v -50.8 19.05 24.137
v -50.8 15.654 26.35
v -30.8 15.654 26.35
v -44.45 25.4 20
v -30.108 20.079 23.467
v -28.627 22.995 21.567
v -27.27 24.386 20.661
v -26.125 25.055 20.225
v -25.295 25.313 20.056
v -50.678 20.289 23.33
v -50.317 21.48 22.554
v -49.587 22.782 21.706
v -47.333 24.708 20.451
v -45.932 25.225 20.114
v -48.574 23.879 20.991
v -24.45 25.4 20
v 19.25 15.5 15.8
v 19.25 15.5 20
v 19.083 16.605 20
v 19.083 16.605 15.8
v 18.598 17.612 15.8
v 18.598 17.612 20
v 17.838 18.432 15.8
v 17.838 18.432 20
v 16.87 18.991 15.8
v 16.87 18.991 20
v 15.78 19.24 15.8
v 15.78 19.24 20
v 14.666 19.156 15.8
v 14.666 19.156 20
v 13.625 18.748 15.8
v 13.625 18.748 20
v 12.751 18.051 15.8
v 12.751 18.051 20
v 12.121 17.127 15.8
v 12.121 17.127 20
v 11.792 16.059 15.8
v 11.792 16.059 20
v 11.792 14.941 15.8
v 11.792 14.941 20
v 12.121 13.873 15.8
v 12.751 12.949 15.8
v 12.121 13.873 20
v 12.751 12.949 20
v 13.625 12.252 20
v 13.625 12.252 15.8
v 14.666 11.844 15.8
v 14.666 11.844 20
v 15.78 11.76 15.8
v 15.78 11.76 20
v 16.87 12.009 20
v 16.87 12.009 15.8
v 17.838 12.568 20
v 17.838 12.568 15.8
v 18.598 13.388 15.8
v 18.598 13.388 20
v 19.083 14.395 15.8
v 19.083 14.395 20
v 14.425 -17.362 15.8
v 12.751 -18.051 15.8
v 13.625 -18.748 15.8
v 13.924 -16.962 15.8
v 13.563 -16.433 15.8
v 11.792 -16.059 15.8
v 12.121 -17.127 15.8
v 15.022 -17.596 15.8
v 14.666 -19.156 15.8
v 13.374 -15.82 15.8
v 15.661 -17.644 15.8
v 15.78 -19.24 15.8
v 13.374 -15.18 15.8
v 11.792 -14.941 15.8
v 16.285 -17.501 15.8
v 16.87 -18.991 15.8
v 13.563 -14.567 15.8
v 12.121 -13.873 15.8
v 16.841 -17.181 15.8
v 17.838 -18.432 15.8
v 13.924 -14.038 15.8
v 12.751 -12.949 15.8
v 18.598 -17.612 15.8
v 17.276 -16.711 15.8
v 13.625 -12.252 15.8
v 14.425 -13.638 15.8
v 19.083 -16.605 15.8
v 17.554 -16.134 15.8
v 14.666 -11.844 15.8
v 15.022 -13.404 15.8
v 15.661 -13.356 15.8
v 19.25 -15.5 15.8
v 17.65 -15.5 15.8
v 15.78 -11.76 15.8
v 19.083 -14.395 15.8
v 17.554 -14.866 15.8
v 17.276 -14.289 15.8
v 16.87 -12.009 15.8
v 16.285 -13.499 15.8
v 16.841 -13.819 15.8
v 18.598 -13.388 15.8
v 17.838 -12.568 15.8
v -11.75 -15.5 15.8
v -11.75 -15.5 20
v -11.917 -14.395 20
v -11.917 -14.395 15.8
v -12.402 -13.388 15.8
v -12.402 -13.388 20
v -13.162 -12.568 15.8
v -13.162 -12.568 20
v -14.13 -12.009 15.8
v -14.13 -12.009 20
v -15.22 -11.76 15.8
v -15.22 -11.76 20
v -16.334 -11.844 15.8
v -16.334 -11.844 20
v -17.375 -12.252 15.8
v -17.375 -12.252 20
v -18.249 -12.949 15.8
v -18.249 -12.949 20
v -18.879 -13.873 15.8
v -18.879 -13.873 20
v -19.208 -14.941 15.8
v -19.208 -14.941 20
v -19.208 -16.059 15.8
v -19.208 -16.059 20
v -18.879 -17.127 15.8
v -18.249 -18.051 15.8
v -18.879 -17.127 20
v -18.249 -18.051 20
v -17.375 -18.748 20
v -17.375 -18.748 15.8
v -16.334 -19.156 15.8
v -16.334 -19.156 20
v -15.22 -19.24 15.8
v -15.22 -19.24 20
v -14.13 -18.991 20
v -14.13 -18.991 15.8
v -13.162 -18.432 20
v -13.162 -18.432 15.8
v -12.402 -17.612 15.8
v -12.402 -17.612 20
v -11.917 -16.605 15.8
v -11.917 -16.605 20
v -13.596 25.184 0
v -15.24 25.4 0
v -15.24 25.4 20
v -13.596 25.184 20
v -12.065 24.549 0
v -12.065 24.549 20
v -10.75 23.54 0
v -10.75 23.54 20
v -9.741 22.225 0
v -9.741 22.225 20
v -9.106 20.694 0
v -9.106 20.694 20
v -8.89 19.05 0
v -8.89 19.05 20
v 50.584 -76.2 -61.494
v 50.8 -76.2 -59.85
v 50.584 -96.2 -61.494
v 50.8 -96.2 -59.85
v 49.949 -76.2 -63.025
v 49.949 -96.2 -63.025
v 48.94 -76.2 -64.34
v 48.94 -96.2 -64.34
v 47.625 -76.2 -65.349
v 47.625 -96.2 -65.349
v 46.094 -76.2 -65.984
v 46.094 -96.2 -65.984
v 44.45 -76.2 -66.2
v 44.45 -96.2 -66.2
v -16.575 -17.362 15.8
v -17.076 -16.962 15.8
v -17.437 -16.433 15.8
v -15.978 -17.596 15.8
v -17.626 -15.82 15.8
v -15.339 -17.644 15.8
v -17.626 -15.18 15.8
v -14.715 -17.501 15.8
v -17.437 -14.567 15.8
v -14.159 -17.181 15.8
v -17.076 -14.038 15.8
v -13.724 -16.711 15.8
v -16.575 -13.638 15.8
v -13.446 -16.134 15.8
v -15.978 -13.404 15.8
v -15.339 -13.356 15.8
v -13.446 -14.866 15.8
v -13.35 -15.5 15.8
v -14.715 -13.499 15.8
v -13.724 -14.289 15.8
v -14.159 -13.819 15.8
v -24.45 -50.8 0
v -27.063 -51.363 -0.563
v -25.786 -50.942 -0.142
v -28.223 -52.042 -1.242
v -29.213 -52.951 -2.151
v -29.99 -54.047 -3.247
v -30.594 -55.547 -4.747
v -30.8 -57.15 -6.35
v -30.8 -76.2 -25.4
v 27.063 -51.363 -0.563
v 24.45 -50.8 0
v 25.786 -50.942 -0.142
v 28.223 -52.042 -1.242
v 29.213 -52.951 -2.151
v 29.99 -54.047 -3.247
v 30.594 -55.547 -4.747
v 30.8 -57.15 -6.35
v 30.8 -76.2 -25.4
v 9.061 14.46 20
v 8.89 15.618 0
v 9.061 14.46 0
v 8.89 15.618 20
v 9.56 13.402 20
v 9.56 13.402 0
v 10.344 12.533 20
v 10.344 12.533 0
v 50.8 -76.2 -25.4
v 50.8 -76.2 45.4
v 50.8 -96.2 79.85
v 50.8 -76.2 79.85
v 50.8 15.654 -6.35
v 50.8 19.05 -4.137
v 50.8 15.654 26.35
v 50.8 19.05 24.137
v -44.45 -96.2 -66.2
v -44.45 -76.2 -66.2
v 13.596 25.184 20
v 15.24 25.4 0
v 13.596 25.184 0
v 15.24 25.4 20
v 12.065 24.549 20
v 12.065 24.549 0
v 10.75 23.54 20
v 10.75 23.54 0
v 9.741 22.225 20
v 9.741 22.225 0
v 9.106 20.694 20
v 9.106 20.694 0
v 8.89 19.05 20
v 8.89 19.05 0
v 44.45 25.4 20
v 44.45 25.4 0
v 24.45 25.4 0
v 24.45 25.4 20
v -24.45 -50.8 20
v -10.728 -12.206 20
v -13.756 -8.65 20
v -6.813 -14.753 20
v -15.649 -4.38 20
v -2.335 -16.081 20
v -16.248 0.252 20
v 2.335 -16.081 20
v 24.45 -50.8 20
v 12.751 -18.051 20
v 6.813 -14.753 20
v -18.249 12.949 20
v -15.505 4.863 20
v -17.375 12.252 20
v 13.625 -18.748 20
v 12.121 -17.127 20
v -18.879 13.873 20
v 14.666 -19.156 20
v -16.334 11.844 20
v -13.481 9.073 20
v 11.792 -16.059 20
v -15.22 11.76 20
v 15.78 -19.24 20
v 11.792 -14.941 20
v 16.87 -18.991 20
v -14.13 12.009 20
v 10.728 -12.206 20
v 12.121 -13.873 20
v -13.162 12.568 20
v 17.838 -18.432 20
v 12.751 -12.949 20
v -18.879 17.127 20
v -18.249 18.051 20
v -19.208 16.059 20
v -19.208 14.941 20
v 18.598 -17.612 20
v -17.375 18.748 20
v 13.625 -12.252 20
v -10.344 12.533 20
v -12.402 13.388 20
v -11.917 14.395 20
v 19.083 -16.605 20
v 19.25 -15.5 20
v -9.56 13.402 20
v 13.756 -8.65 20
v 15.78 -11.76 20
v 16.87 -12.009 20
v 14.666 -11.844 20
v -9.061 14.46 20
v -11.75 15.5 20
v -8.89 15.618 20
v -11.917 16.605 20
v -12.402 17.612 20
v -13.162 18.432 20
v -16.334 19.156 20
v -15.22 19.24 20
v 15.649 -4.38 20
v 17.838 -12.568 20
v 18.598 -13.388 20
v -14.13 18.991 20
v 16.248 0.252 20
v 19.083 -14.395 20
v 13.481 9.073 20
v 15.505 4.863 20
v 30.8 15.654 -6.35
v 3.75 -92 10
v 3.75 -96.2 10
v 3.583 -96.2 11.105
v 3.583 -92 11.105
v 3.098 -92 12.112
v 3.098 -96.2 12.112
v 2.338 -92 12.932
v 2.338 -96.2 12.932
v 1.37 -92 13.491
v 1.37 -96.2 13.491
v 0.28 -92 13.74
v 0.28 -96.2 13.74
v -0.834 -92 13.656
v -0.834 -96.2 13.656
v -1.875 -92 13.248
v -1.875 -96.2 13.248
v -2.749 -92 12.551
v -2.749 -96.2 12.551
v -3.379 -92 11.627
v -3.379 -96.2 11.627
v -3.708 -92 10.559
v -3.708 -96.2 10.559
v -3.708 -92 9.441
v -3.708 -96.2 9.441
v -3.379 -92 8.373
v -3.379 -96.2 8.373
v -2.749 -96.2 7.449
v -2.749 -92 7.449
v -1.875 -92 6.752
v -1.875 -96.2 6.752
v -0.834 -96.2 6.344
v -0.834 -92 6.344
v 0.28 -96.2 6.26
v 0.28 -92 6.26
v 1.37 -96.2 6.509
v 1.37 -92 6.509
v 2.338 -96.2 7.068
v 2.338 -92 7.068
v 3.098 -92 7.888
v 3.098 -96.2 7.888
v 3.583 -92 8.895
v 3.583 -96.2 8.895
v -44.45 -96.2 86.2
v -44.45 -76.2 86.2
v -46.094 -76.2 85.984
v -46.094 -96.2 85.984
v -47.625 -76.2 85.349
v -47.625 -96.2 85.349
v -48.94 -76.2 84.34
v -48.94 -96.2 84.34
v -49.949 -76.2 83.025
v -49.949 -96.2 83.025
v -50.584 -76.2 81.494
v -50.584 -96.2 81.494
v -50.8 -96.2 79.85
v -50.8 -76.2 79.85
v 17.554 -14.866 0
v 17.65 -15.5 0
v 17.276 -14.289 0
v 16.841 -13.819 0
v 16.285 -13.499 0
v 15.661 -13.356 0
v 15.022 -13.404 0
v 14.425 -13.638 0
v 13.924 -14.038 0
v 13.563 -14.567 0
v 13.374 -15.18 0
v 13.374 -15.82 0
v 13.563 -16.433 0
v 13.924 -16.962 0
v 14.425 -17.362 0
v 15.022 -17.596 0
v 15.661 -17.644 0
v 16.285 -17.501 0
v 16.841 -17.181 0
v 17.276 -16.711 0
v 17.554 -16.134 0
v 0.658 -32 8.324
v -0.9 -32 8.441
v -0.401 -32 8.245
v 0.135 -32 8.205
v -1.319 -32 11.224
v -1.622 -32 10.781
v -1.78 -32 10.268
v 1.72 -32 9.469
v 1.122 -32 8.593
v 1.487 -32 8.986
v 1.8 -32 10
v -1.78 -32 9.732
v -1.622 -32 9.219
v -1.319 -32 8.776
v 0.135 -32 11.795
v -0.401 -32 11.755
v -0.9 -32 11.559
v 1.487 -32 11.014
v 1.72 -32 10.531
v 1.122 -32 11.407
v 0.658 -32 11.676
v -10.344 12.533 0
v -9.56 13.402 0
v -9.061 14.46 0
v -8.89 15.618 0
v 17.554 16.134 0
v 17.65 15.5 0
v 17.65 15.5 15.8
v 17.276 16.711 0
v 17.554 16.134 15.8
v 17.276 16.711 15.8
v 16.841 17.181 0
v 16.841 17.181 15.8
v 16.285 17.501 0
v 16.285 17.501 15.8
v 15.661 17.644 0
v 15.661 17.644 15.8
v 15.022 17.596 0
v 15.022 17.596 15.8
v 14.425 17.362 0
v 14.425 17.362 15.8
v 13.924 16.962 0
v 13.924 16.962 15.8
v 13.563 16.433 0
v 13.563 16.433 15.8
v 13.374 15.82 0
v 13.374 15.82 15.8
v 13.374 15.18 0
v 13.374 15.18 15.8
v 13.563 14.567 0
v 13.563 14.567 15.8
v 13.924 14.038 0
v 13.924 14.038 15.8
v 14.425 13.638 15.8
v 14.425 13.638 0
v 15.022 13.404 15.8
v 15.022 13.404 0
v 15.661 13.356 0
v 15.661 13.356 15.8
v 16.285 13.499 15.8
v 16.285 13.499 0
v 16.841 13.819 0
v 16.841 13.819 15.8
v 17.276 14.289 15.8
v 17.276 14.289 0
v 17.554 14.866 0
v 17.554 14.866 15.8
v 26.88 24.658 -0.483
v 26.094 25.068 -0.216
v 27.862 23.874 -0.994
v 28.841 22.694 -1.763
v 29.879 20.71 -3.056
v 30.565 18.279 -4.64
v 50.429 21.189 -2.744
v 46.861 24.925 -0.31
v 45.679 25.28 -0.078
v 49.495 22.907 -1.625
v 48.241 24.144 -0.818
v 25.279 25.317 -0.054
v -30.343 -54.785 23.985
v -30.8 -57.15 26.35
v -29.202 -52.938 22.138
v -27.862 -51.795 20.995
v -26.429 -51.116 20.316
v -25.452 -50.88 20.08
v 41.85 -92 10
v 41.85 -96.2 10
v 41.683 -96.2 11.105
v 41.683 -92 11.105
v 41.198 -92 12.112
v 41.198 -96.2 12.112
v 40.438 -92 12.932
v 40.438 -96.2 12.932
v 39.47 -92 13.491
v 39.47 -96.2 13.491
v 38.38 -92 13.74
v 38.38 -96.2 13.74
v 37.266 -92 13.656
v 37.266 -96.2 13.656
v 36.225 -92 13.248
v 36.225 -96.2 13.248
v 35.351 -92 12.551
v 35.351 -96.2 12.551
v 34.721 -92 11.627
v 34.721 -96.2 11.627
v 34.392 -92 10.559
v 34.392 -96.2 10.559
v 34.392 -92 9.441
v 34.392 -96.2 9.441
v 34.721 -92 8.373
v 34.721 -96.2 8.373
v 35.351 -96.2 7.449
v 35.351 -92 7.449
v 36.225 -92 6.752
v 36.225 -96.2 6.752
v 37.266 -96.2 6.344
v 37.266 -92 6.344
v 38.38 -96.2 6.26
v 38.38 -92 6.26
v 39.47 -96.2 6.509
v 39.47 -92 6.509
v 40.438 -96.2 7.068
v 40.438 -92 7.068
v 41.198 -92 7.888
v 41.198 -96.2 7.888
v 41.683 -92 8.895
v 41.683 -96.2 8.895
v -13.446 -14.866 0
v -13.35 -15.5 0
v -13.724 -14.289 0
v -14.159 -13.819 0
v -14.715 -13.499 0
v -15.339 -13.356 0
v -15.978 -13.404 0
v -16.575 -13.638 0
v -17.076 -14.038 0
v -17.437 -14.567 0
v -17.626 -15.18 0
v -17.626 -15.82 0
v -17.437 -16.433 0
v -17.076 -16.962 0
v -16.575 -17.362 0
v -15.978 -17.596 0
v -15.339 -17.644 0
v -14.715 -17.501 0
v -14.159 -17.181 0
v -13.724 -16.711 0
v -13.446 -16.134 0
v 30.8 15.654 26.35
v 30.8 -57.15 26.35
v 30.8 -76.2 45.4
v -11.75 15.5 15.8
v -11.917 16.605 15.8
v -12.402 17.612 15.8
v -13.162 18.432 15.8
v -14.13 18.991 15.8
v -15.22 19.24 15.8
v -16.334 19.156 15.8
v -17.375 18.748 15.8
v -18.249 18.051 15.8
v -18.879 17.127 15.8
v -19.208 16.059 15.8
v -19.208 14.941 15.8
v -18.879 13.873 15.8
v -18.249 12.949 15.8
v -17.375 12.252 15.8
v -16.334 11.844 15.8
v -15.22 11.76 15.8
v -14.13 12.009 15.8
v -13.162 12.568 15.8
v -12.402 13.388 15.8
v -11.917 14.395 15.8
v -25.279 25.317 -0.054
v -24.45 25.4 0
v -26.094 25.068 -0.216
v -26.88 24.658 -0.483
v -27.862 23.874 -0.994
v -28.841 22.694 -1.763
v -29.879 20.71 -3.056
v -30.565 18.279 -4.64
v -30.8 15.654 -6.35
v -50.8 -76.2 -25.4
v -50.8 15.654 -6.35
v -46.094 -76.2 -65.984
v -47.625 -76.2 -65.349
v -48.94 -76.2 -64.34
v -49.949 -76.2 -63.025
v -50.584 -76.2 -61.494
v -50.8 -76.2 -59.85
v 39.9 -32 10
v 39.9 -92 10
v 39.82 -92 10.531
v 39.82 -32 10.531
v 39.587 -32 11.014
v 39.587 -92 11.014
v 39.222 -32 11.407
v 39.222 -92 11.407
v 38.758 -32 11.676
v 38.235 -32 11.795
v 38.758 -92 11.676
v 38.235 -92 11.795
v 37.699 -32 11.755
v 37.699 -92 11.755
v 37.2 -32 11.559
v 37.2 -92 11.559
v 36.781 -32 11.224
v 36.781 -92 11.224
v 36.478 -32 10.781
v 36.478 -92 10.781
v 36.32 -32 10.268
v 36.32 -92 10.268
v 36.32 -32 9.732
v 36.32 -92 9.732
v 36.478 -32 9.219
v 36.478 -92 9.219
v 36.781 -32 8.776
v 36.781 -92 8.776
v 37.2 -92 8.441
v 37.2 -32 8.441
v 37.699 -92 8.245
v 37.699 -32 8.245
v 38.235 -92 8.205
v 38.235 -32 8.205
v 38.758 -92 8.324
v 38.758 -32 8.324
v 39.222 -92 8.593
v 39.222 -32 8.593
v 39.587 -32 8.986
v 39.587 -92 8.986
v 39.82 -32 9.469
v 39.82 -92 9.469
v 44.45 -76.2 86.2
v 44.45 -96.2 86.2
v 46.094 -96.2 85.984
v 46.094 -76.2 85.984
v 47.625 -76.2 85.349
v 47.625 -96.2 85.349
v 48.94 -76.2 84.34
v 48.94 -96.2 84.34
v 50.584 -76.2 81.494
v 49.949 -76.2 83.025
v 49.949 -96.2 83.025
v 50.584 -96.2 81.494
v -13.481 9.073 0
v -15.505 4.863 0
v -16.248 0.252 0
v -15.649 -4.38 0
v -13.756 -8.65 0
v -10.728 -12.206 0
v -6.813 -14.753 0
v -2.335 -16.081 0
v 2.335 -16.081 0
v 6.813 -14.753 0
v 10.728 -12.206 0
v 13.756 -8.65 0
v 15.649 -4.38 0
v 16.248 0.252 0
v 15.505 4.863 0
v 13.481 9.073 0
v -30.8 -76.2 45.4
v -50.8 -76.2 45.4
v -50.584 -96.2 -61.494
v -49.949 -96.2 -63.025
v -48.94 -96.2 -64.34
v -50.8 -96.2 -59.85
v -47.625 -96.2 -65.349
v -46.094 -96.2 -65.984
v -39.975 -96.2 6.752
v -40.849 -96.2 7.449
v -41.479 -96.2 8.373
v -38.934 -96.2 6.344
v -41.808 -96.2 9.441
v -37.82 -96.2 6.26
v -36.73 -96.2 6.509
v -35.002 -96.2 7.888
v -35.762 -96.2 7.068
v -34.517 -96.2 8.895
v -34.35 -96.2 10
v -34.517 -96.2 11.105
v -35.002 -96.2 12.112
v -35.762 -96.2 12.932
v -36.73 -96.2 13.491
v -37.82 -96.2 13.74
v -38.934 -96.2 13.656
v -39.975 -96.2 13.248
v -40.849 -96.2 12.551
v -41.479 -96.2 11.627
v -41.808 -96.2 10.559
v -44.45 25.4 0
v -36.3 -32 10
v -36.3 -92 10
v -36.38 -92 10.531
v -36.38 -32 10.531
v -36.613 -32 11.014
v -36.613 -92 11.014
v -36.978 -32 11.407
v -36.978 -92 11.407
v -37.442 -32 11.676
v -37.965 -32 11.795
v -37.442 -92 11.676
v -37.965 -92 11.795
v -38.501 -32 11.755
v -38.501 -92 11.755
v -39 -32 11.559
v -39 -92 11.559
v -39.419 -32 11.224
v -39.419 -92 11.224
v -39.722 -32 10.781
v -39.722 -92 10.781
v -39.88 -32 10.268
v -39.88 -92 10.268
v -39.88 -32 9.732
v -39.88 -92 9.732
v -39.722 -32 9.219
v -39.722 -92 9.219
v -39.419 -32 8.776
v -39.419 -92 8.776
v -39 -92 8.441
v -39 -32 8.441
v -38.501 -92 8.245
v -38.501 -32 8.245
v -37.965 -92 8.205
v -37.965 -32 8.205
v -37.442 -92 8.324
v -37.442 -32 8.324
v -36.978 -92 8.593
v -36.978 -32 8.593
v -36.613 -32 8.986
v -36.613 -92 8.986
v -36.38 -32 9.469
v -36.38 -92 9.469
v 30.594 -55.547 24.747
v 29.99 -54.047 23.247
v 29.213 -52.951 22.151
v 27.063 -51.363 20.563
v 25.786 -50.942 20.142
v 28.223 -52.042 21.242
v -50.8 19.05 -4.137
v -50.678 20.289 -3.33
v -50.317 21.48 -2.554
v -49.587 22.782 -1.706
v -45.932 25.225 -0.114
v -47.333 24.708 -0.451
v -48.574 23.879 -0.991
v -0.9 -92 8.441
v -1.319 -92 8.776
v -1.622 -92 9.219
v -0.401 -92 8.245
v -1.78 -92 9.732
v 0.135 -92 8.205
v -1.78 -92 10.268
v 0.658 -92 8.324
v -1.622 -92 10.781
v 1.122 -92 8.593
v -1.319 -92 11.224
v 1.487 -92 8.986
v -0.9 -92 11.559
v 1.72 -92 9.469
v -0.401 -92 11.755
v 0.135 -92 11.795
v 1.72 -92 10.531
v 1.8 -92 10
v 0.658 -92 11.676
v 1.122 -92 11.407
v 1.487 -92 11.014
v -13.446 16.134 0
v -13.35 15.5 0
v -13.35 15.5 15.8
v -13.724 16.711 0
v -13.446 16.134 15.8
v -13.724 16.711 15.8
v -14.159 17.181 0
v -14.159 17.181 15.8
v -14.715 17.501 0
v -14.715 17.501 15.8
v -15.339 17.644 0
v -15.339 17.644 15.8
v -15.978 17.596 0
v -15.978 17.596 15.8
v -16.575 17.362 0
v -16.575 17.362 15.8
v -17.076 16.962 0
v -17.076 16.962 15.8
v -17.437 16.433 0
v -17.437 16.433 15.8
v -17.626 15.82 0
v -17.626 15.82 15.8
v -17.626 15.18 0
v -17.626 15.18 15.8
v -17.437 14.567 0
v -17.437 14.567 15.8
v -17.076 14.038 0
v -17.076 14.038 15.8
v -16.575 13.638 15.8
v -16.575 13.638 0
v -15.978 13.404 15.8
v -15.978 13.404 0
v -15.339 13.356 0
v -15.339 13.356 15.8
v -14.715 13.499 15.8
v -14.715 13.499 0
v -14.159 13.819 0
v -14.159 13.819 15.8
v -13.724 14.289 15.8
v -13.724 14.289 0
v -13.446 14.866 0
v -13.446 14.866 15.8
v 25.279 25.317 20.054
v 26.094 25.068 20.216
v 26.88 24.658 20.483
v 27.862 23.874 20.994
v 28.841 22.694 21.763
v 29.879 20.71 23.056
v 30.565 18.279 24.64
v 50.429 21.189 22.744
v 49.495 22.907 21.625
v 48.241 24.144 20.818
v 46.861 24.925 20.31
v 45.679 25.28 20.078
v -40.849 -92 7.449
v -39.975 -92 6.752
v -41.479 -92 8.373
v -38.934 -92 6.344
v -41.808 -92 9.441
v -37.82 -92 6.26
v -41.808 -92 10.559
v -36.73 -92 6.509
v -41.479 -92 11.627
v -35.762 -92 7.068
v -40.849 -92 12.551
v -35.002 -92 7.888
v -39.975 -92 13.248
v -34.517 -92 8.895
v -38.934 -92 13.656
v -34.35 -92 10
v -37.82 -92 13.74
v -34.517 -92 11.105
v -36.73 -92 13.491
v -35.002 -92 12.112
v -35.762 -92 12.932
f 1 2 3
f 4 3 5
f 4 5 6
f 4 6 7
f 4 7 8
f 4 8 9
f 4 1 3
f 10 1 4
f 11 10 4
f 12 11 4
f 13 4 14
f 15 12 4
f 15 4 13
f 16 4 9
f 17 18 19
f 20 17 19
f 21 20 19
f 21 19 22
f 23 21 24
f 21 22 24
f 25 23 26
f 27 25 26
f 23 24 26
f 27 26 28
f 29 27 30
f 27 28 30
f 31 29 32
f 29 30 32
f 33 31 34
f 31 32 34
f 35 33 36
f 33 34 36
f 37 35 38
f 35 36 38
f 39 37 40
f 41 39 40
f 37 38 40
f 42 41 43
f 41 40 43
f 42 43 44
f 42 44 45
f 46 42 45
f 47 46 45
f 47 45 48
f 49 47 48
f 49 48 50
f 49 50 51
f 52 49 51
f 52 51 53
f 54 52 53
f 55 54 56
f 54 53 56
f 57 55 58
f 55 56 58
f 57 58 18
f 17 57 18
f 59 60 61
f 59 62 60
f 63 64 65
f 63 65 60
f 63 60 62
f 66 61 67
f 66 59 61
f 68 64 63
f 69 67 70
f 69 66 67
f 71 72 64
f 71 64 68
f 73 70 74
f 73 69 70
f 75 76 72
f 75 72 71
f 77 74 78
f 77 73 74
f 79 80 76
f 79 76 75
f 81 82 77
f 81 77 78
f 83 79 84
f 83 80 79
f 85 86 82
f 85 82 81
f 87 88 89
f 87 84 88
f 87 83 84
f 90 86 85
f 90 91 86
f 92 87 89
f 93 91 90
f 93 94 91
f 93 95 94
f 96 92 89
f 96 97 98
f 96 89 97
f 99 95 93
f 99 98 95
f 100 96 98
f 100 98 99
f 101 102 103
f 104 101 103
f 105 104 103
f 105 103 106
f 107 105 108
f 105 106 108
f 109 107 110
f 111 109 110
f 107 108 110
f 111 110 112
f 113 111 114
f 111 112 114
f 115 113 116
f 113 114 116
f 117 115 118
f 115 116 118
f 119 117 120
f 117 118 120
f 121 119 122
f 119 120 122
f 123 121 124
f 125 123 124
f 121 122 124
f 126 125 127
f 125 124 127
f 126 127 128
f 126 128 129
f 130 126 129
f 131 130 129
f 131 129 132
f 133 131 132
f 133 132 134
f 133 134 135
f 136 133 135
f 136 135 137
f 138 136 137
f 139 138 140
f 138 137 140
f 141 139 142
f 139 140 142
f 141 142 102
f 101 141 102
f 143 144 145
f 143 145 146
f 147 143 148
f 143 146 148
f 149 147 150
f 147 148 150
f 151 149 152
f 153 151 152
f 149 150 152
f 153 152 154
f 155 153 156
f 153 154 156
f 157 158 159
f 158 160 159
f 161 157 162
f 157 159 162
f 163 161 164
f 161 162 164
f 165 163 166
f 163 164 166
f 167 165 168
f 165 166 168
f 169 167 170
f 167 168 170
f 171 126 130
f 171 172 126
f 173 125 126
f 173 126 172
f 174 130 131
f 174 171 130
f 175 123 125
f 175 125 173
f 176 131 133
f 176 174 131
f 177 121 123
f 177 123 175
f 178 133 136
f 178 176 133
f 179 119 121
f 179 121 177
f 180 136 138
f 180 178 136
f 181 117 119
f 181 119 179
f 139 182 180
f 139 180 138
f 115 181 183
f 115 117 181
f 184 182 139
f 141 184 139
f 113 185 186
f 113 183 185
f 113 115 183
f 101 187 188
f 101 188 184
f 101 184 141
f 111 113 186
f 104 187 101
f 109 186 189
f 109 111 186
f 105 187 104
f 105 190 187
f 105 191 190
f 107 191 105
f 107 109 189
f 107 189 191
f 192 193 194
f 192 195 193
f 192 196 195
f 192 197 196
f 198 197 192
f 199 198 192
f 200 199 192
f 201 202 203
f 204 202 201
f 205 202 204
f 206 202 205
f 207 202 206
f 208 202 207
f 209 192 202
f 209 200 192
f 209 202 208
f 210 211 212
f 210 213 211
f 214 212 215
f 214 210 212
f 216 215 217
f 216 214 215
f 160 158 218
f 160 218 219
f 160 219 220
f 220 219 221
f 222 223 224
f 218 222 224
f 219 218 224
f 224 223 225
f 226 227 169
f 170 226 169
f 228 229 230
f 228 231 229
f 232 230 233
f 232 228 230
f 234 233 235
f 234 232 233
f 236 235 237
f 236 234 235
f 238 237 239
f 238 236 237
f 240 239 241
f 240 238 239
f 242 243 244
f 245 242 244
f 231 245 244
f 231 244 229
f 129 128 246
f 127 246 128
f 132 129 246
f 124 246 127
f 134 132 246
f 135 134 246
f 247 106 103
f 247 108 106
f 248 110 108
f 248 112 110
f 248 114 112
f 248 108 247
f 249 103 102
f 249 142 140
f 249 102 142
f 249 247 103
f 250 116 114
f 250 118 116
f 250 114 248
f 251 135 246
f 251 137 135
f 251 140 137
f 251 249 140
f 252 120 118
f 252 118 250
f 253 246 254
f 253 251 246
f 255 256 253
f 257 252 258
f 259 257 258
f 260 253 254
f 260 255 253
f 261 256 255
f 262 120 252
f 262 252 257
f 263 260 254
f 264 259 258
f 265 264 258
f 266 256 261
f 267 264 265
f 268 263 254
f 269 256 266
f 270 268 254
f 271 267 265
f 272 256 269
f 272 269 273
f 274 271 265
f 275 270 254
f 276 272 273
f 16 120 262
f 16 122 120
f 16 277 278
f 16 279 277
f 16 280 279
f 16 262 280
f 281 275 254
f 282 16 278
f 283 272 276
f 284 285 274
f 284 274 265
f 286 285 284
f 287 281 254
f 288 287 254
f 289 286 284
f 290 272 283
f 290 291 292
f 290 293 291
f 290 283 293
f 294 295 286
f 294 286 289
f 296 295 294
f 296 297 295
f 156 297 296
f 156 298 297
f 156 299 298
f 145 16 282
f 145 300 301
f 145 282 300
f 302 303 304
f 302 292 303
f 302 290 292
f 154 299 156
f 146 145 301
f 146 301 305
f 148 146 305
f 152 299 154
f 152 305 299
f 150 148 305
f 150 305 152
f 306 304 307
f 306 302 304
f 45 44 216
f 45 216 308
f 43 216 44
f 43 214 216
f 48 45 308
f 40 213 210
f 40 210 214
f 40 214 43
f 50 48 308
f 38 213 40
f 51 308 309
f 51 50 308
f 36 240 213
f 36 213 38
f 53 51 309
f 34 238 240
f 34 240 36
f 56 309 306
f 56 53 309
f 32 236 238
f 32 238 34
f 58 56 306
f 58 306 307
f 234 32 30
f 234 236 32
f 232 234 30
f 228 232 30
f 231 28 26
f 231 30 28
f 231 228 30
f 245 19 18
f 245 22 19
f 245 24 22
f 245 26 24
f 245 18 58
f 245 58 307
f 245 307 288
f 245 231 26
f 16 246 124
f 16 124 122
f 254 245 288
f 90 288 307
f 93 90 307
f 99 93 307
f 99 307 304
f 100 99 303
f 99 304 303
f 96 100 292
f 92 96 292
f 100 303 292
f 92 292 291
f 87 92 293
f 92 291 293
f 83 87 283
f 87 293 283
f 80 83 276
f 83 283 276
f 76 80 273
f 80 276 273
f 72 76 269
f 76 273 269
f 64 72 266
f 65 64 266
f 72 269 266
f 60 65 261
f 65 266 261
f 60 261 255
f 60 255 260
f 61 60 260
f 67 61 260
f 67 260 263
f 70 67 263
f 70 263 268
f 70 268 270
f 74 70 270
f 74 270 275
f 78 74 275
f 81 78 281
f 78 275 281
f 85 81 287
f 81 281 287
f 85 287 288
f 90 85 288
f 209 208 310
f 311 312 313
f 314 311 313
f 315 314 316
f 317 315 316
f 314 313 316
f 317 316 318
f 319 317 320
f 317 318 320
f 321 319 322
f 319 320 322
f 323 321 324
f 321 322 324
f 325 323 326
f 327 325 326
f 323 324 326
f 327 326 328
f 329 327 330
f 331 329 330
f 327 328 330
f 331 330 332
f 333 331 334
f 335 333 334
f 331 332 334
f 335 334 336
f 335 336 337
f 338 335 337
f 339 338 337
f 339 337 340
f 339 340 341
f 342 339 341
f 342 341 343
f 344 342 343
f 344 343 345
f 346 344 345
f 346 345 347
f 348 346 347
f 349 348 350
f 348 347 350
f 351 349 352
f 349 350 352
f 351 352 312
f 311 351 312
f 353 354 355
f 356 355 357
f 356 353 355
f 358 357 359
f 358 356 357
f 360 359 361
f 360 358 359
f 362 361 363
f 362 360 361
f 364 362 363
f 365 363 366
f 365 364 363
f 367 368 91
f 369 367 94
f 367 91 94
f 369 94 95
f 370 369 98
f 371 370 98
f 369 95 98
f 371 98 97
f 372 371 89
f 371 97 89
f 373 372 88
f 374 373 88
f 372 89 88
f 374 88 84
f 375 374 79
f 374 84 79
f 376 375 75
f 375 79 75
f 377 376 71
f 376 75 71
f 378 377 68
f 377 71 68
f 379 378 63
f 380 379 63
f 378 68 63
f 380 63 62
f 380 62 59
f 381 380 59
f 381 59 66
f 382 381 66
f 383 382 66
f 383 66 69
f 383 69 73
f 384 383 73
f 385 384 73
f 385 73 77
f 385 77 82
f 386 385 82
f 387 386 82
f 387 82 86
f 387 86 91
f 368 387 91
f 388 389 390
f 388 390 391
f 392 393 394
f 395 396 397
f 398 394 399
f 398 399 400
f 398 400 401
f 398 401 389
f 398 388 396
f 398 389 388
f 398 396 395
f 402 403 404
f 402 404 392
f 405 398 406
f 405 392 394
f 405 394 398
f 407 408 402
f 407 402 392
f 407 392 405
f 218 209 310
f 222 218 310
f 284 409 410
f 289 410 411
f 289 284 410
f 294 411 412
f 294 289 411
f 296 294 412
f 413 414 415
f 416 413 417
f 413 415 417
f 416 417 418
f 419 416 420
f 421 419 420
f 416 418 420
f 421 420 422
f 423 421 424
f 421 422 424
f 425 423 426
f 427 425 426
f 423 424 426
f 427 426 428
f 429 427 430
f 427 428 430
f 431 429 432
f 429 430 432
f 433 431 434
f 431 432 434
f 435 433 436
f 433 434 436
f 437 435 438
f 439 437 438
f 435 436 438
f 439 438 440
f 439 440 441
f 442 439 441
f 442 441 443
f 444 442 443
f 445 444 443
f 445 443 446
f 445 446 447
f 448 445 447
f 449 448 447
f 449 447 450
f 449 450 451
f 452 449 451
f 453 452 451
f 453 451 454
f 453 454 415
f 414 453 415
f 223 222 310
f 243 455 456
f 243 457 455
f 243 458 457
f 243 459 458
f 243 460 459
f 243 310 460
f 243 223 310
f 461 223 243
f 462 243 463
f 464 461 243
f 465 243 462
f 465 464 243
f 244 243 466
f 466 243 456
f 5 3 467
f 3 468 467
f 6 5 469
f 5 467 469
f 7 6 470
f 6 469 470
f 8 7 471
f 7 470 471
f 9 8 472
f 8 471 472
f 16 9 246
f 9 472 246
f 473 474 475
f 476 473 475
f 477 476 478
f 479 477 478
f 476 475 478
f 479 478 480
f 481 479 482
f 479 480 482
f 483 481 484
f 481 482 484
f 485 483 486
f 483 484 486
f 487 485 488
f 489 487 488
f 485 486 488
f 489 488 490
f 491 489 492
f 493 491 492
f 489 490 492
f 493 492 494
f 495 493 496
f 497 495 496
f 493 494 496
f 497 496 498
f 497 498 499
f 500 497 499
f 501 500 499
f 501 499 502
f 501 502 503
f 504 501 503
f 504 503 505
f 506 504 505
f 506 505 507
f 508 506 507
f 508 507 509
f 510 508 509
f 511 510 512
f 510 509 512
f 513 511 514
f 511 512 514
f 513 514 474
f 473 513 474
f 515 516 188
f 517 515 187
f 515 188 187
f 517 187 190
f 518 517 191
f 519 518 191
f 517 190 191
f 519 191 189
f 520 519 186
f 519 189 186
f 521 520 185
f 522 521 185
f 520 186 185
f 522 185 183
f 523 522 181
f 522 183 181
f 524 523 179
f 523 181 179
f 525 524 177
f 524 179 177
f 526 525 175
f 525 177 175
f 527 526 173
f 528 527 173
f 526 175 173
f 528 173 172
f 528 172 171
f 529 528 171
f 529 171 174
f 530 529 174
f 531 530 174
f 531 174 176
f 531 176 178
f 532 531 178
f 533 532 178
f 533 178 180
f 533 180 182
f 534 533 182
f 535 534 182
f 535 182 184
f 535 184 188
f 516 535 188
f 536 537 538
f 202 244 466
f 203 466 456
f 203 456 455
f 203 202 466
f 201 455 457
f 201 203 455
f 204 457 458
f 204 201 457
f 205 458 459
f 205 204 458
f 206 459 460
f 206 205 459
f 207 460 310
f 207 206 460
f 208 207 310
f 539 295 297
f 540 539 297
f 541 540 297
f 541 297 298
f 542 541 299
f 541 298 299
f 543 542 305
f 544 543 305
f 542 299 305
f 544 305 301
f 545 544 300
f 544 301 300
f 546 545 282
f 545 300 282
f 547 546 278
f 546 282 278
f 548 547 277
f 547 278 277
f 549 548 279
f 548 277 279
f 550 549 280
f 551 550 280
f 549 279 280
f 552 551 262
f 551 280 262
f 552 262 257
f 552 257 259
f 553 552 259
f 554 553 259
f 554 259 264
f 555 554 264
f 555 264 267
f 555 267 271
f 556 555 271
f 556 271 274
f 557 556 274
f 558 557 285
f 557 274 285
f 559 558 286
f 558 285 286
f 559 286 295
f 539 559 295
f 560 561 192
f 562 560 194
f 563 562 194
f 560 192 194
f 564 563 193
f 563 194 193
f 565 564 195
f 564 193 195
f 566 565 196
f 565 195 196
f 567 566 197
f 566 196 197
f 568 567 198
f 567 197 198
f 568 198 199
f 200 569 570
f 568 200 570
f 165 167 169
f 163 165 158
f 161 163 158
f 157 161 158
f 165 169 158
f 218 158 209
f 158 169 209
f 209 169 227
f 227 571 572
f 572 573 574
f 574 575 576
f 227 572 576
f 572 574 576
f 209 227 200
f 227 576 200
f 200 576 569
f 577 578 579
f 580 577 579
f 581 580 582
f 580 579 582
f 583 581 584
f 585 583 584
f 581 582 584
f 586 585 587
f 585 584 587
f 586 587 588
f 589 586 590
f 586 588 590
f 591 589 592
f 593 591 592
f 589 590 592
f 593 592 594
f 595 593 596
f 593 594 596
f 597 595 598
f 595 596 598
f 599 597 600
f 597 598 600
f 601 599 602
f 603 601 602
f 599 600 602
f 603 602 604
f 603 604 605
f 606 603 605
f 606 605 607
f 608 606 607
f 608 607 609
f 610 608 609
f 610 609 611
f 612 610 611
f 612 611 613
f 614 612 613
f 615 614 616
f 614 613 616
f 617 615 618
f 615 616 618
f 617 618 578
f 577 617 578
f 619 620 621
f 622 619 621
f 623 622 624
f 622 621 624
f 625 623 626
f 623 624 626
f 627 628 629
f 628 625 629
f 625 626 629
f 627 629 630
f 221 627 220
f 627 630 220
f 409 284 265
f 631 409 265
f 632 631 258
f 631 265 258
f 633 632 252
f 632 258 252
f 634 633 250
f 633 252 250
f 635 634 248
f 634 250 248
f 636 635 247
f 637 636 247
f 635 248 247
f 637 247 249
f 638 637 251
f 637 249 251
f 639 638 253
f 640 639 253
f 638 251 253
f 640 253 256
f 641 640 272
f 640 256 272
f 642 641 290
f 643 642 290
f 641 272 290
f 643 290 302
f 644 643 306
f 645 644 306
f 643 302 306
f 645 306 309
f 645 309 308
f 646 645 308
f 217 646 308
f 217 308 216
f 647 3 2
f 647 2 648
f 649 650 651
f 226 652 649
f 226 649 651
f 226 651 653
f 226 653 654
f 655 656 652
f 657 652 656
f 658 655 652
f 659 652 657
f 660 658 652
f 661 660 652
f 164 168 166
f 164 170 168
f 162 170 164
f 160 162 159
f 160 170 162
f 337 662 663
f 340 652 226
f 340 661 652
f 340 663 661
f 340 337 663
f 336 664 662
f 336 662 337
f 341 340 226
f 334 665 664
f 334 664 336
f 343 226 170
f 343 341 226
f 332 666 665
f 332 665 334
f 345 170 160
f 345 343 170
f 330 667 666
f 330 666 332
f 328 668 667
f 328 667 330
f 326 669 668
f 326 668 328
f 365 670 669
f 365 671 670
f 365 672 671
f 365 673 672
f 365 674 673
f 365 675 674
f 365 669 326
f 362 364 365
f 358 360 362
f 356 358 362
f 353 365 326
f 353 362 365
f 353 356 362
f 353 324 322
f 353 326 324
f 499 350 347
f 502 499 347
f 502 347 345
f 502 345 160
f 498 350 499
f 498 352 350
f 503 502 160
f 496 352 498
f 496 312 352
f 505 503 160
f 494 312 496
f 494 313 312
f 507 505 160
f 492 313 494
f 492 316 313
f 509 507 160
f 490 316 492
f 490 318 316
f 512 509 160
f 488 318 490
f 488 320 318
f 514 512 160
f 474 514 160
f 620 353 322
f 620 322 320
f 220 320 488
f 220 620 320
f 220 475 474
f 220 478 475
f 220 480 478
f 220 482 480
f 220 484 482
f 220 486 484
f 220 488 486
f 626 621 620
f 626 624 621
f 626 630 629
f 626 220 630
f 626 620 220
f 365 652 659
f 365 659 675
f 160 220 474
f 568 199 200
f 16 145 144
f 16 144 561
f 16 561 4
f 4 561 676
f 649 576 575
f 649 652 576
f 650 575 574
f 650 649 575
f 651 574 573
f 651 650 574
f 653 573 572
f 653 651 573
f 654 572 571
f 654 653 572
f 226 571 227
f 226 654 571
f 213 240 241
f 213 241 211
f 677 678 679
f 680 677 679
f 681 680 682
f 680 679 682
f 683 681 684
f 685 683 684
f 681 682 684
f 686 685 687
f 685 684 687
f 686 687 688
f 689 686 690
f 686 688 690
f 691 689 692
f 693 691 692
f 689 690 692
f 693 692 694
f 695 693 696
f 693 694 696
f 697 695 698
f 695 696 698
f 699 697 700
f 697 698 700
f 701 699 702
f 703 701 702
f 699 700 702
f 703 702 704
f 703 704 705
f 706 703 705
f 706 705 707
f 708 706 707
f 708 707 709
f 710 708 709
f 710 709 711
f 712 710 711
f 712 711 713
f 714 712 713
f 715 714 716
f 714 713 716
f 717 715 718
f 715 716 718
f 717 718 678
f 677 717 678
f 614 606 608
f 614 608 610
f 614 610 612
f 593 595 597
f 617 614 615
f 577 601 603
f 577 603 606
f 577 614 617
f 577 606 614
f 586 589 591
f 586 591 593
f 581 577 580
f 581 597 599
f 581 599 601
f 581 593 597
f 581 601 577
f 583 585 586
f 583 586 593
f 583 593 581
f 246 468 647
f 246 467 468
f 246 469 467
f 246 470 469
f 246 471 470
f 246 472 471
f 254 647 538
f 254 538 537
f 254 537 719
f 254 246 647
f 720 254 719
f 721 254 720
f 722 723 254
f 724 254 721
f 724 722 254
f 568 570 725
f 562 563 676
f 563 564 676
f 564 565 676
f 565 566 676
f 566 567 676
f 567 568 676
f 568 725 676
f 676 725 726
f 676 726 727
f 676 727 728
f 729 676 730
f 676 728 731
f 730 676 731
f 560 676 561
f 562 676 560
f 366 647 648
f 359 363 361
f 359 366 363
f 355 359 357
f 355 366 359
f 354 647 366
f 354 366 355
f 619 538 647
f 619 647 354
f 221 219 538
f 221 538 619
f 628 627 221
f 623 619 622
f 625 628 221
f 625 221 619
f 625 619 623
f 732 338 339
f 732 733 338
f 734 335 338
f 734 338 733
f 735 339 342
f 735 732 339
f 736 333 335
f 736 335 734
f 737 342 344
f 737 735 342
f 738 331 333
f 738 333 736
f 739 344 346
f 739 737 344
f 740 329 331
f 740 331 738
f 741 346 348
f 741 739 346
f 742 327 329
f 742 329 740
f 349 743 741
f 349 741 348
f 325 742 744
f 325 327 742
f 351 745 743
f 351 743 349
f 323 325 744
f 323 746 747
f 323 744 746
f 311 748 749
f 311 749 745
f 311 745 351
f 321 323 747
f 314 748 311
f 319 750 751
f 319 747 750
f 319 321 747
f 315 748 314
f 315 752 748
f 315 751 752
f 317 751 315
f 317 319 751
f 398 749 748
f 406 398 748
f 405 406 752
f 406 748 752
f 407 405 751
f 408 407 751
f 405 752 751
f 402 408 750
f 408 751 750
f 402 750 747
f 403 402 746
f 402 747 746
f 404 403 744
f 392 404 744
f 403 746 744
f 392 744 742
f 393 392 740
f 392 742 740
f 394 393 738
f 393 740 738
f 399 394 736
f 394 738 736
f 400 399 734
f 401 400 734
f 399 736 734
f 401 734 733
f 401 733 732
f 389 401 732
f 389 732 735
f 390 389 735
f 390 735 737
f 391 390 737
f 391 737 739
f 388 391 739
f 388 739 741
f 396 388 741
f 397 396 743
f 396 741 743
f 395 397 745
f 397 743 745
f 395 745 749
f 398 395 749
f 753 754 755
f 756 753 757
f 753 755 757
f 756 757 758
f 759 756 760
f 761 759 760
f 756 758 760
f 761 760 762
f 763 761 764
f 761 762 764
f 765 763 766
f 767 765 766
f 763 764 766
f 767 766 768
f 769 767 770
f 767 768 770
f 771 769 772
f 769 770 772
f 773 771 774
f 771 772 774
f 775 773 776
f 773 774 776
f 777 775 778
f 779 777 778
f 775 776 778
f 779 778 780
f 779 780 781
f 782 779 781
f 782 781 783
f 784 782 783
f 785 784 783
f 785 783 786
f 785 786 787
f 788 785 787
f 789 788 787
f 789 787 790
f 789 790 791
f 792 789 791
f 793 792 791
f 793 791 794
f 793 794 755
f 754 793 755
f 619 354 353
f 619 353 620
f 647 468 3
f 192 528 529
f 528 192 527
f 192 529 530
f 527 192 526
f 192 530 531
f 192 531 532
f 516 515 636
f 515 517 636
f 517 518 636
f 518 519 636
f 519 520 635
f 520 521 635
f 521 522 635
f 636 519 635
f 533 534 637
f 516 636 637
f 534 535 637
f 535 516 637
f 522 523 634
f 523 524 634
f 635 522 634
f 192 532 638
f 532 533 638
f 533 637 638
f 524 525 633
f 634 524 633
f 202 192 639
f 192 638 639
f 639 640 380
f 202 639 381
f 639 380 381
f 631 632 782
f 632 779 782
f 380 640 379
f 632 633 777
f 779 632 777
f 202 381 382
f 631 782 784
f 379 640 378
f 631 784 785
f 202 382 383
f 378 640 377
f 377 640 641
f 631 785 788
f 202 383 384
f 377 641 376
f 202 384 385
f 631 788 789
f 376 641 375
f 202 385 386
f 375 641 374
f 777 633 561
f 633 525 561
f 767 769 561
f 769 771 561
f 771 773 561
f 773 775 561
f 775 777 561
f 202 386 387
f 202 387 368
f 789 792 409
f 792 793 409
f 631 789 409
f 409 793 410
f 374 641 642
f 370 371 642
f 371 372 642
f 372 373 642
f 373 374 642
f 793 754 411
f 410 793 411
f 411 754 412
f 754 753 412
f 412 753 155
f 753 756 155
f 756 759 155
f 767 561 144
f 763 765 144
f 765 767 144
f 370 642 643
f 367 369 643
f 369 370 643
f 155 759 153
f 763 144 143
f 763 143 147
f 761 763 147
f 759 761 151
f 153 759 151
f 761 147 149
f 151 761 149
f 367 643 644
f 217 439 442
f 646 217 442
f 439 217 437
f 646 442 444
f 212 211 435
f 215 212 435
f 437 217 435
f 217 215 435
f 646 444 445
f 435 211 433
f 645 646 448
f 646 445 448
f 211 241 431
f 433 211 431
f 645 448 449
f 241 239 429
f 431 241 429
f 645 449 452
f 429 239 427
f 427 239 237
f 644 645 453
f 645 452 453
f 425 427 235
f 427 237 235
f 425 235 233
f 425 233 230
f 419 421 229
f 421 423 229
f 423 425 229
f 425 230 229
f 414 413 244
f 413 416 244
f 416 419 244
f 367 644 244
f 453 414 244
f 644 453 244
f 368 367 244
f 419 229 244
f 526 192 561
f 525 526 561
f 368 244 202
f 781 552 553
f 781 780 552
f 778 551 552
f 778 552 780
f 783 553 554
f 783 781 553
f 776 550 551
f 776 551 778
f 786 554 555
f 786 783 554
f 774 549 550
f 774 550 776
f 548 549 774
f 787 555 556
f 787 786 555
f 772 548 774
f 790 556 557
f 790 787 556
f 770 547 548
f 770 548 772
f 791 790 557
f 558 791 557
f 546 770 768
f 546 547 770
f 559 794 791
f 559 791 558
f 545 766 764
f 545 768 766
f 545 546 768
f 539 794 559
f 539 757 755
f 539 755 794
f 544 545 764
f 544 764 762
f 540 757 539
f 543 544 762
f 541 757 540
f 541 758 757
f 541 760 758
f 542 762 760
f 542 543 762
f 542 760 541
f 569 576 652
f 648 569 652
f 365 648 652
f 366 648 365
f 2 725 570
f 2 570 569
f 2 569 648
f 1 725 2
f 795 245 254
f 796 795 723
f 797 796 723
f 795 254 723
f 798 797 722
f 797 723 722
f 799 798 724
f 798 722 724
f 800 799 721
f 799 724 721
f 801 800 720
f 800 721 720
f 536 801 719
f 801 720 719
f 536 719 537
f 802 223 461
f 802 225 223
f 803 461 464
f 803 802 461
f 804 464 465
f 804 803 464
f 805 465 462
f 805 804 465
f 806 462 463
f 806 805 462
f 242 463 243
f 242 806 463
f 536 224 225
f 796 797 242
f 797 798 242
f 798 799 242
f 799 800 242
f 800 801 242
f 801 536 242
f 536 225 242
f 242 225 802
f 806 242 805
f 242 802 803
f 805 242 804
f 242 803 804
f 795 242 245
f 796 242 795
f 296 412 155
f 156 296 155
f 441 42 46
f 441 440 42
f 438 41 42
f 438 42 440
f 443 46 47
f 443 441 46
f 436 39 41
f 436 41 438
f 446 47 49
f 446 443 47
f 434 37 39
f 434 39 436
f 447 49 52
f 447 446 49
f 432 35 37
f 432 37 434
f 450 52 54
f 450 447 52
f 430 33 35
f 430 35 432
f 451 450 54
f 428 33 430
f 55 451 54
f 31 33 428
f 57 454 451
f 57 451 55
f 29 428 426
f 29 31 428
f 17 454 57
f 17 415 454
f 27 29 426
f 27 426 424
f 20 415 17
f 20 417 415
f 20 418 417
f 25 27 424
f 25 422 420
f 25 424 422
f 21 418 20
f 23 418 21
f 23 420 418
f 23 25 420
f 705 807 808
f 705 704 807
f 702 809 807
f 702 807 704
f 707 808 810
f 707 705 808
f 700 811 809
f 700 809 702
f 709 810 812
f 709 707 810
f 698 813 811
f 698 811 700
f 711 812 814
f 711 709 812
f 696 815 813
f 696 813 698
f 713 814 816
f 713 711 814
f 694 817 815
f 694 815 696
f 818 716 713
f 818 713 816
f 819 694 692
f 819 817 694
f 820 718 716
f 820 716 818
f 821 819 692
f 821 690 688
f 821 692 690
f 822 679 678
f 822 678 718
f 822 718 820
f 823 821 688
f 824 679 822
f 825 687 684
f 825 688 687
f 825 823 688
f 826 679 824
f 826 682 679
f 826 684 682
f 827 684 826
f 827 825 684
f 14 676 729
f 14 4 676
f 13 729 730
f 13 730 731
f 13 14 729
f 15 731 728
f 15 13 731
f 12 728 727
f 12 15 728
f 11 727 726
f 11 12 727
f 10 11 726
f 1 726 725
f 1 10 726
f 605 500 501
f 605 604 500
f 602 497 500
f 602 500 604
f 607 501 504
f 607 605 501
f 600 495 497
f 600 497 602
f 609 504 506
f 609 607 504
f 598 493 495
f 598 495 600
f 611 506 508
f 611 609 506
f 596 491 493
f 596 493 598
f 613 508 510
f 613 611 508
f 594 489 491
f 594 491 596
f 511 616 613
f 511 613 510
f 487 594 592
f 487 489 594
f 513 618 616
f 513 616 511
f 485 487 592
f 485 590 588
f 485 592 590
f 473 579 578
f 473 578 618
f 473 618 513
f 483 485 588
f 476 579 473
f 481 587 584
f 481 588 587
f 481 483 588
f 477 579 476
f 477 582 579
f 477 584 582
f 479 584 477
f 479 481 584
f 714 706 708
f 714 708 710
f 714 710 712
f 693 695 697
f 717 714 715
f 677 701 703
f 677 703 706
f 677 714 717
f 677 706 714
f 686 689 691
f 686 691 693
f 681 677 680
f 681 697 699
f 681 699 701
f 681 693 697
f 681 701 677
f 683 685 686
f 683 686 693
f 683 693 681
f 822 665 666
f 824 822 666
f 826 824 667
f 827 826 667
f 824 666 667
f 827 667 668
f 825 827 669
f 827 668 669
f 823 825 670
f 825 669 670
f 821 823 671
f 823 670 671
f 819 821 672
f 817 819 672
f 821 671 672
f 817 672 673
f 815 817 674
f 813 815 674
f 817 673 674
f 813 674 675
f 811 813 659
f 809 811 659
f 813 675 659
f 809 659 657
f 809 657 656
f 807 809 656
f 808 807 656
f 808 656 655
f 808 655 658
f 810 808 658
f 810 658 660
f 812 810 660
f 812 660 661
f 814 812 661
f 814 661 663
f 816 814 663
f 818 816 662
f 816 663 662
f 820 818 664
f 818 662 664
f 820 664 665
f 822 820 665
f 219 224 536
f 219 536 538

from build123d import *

# Parameters (mm, degrees)
BOSS_EXTRUDE1_DEPTH = 20
SKETCH2_R           = 16.25
SKETCH2_R_2         = 2.15
CUT_EXTRUDE1_DEPTH  = 20
SKETCH5_R           = 3.75
CUT_EXTRUDE4_DEPTH  = 4.2
FILLET3_R           = 4
SKETCH6_W           = 101.6
SKETCH6_H           = 152.4
BOSS_EXTRUDE2_DEPTH = 20
SKETCH7_R           = 3.75
CUT_EXTRUDE5_DEPTH  = 4.2
SKETCH8_R           = 1.8
CUT_EXTRUDE6_DEPTH  = 60
CHAMFER1_SIZE       = 25.4
BOSS_EXTRUDE4_DEPTH = 20
FILLET4_R           = 6.35
CUT_EXTRUDE8_DEPTH  = 165.339404891
CUT_EXTRUDE9_DEPTH  = 165.339404891


with BuildPart() as part:
    # Sketch1 → Boss-Extrude1 (new body)
    with BuildSketch(Plane.XY):
        Polygon((50.8, 25.4), (8.89, 25.4), (8.89, 13.302928249), (-8.89, 13.302928249), (-8.89, 25.4), (-50.8, 25.4), (-50.8, -76.2), (50.8, -76.2), align=None)
    extrude(amount=BOSS_EXTRUDE1_DEPTH)

    # Sketch2 → Cut-Extrude1 (cut)
    with BuildSketch(Plane.XY.offset(20)):
        Circle(SKETCH2_R)
        with Locations((-15.5, -15.5)):
            Circle(SKETCH2_R_2)
        with Locations((-15.5, 15.5)):
            Circle(SKETCH2_R_2)
        with Locations((15.5, -15.5)):
            Circle(SKETCH2_R_2)
        with Locations((15.5, 15.5)):
            Circle(SKETCH2_R_2)
    extrude(amount=-CUT_EXTRUDE1_DEPTH, mode=Mode.SUBTRACT)

    # Sketch5 → Cut-Extrude4 (cut)
    with BuildSketch(Plane.XY.offset(20)):
        with Locations((-15.5, 15.5)):
            Circle(SKETCH5_R)
        with Locations((15.5, 15.5)):
            Circle(SKETCH5_R)
        with Locations((15.5, -15.5)):
            Circle(SKETCH5_R)
        with Locations((-15.5, -15.5)):
            Circle(SKETCH5_R)
    extrude(amount=-CUT_EXTRUDE4_DEPTH, mode=Mode.SUBTRACT)

    # Fillet3
    fillet3_edges = [part.edges().sort_by_distance(p)[0] for p in [
        (8.89, 13.602587989, 10),
        (-8.89, 13.602587989, 10),
    ]]
    fillet(fillet3_edges, radius=FILLET3_R)

    # Sketch6 → Boss-Extrude2 (add)
    with BuildSketch(Plane.XZ.offset(76.2)):
        with Locations((0, 10)):
            Rectangle(SKETCH6_W, SKETCH6_H)
    extrude(amount=BOSS_EXTRUDE2_DEPTH)

    # Sketch7 → Cut-Extrude5 (cut)
    with BuildSketch(Plane.XZ.offset(96.2)):
        with Locations((-38.1, 10)):
            Circle(SKETCH7_R)
        with Locations((38.1, 10)):
            Circle(SKETCH7_R)
        with Locations((0, 10)):
            Circle(SKETCH7_R)
    extrude(amount=-CUT_EXTRUDE5_DEPTH, mode=Mode.SUBTRACT)

    # Sketch8 → Cut-Extrude6 (cut)
    with BuildSketch(Plane.XZ.offset(92)):
        with Locations((-38.1, 10)):
            Circle(SKETCH8_R)
        with Locations((38.1, 10)):
            Circle(SKETCH8_R)
        with Locations((0, 10)):
            Circle(SKETCH8_R)
    extrude(amount=-CUT_EXTRUDE6_DEPTH, mode=Mode.SUBTRACT)

    # Chamfer1
    chamfer1_edges = [part.edges().sort_by_distance(p)[0] for p in [
        (0, -76.2, 0),
        (0, -76.2, 20),
    ]]
    chamfer(chamfer1_edges, length=CHAMFER1_SIZE)

    # Sketch12 → Boss-Extrude4 (add)
    with BuildSketch(Plane(origin=(50.8, 0, 0), x_dir=(0, 0, -1), z_dir=(1, 0, 0))):
        Polygon((-86.2, -76.2), (-20, 25.4), (-20, -76.2), align=None)
        Polygon((0, -76.2), (66.2, -76.2), (0, 25.4), align=None)
    boss_extrude4 = extrude(amount=-BOSS_EXTRUDE4_DEPTH)

    # Mirror2: Boss-Extrude4 across plane
    add(boss_extrude4.mirror(Plane(origin=(0, 0, 0), x_dir=(0, 0, 1), z_dir=(1, 0, 0))))

    # Fillet4
    fillet4_edges = [part.edges().sort_by_distance(p)[0] for p in [
        (50.8, -86.2, -66.2),
        (50.8, -86.2, 86.2),
        (-50.8, -86.2, 86.2),
        (-50.8, -86.2, -66.2),
        (-50.8, 25.4, 10),
        (-8.89, 25.4, 10),
        (8.89, 25.4, 10),
        (50.8, 25.4, 10),
        (30.8, -12.7, 20),
        (30.8, -12.7, 0),
        (-30.8, -12.7, 20),
        (-30.8, -12.7, 0),
    ]]
    fillet(fillet4_edges, radius=FILLET4_R)

    # Sketch16 → Cut-Extrude8 (cut, through all)
    with BuildSketch(Plane.ZY.offset(50.8)):
        Polygon((-66.2, -76.2), (-25.4, -76.2), (-6.35, 15.654380665), align=None)
    extrude(amount=-CUT_EXTRUDE8_DEPTH, mode=Mode.SUBTRACT)

    # Sketch14 → Cut-Extrude9 (cut, through all)
    with BuildSketch(Plane(origin=(50.8, 0, 0), x_dir=(0, 0, -1), z_dir=(1, 0, 0))):
        Polygon((-86.2, -76.2), (-26.35, 15.654380665), (-45.4, -76.2), align=None)
    extrude(amount=-CUT_EXTRUDE9_DEPTH, mode=Mode.SUBTRACT)


solid = part.part
